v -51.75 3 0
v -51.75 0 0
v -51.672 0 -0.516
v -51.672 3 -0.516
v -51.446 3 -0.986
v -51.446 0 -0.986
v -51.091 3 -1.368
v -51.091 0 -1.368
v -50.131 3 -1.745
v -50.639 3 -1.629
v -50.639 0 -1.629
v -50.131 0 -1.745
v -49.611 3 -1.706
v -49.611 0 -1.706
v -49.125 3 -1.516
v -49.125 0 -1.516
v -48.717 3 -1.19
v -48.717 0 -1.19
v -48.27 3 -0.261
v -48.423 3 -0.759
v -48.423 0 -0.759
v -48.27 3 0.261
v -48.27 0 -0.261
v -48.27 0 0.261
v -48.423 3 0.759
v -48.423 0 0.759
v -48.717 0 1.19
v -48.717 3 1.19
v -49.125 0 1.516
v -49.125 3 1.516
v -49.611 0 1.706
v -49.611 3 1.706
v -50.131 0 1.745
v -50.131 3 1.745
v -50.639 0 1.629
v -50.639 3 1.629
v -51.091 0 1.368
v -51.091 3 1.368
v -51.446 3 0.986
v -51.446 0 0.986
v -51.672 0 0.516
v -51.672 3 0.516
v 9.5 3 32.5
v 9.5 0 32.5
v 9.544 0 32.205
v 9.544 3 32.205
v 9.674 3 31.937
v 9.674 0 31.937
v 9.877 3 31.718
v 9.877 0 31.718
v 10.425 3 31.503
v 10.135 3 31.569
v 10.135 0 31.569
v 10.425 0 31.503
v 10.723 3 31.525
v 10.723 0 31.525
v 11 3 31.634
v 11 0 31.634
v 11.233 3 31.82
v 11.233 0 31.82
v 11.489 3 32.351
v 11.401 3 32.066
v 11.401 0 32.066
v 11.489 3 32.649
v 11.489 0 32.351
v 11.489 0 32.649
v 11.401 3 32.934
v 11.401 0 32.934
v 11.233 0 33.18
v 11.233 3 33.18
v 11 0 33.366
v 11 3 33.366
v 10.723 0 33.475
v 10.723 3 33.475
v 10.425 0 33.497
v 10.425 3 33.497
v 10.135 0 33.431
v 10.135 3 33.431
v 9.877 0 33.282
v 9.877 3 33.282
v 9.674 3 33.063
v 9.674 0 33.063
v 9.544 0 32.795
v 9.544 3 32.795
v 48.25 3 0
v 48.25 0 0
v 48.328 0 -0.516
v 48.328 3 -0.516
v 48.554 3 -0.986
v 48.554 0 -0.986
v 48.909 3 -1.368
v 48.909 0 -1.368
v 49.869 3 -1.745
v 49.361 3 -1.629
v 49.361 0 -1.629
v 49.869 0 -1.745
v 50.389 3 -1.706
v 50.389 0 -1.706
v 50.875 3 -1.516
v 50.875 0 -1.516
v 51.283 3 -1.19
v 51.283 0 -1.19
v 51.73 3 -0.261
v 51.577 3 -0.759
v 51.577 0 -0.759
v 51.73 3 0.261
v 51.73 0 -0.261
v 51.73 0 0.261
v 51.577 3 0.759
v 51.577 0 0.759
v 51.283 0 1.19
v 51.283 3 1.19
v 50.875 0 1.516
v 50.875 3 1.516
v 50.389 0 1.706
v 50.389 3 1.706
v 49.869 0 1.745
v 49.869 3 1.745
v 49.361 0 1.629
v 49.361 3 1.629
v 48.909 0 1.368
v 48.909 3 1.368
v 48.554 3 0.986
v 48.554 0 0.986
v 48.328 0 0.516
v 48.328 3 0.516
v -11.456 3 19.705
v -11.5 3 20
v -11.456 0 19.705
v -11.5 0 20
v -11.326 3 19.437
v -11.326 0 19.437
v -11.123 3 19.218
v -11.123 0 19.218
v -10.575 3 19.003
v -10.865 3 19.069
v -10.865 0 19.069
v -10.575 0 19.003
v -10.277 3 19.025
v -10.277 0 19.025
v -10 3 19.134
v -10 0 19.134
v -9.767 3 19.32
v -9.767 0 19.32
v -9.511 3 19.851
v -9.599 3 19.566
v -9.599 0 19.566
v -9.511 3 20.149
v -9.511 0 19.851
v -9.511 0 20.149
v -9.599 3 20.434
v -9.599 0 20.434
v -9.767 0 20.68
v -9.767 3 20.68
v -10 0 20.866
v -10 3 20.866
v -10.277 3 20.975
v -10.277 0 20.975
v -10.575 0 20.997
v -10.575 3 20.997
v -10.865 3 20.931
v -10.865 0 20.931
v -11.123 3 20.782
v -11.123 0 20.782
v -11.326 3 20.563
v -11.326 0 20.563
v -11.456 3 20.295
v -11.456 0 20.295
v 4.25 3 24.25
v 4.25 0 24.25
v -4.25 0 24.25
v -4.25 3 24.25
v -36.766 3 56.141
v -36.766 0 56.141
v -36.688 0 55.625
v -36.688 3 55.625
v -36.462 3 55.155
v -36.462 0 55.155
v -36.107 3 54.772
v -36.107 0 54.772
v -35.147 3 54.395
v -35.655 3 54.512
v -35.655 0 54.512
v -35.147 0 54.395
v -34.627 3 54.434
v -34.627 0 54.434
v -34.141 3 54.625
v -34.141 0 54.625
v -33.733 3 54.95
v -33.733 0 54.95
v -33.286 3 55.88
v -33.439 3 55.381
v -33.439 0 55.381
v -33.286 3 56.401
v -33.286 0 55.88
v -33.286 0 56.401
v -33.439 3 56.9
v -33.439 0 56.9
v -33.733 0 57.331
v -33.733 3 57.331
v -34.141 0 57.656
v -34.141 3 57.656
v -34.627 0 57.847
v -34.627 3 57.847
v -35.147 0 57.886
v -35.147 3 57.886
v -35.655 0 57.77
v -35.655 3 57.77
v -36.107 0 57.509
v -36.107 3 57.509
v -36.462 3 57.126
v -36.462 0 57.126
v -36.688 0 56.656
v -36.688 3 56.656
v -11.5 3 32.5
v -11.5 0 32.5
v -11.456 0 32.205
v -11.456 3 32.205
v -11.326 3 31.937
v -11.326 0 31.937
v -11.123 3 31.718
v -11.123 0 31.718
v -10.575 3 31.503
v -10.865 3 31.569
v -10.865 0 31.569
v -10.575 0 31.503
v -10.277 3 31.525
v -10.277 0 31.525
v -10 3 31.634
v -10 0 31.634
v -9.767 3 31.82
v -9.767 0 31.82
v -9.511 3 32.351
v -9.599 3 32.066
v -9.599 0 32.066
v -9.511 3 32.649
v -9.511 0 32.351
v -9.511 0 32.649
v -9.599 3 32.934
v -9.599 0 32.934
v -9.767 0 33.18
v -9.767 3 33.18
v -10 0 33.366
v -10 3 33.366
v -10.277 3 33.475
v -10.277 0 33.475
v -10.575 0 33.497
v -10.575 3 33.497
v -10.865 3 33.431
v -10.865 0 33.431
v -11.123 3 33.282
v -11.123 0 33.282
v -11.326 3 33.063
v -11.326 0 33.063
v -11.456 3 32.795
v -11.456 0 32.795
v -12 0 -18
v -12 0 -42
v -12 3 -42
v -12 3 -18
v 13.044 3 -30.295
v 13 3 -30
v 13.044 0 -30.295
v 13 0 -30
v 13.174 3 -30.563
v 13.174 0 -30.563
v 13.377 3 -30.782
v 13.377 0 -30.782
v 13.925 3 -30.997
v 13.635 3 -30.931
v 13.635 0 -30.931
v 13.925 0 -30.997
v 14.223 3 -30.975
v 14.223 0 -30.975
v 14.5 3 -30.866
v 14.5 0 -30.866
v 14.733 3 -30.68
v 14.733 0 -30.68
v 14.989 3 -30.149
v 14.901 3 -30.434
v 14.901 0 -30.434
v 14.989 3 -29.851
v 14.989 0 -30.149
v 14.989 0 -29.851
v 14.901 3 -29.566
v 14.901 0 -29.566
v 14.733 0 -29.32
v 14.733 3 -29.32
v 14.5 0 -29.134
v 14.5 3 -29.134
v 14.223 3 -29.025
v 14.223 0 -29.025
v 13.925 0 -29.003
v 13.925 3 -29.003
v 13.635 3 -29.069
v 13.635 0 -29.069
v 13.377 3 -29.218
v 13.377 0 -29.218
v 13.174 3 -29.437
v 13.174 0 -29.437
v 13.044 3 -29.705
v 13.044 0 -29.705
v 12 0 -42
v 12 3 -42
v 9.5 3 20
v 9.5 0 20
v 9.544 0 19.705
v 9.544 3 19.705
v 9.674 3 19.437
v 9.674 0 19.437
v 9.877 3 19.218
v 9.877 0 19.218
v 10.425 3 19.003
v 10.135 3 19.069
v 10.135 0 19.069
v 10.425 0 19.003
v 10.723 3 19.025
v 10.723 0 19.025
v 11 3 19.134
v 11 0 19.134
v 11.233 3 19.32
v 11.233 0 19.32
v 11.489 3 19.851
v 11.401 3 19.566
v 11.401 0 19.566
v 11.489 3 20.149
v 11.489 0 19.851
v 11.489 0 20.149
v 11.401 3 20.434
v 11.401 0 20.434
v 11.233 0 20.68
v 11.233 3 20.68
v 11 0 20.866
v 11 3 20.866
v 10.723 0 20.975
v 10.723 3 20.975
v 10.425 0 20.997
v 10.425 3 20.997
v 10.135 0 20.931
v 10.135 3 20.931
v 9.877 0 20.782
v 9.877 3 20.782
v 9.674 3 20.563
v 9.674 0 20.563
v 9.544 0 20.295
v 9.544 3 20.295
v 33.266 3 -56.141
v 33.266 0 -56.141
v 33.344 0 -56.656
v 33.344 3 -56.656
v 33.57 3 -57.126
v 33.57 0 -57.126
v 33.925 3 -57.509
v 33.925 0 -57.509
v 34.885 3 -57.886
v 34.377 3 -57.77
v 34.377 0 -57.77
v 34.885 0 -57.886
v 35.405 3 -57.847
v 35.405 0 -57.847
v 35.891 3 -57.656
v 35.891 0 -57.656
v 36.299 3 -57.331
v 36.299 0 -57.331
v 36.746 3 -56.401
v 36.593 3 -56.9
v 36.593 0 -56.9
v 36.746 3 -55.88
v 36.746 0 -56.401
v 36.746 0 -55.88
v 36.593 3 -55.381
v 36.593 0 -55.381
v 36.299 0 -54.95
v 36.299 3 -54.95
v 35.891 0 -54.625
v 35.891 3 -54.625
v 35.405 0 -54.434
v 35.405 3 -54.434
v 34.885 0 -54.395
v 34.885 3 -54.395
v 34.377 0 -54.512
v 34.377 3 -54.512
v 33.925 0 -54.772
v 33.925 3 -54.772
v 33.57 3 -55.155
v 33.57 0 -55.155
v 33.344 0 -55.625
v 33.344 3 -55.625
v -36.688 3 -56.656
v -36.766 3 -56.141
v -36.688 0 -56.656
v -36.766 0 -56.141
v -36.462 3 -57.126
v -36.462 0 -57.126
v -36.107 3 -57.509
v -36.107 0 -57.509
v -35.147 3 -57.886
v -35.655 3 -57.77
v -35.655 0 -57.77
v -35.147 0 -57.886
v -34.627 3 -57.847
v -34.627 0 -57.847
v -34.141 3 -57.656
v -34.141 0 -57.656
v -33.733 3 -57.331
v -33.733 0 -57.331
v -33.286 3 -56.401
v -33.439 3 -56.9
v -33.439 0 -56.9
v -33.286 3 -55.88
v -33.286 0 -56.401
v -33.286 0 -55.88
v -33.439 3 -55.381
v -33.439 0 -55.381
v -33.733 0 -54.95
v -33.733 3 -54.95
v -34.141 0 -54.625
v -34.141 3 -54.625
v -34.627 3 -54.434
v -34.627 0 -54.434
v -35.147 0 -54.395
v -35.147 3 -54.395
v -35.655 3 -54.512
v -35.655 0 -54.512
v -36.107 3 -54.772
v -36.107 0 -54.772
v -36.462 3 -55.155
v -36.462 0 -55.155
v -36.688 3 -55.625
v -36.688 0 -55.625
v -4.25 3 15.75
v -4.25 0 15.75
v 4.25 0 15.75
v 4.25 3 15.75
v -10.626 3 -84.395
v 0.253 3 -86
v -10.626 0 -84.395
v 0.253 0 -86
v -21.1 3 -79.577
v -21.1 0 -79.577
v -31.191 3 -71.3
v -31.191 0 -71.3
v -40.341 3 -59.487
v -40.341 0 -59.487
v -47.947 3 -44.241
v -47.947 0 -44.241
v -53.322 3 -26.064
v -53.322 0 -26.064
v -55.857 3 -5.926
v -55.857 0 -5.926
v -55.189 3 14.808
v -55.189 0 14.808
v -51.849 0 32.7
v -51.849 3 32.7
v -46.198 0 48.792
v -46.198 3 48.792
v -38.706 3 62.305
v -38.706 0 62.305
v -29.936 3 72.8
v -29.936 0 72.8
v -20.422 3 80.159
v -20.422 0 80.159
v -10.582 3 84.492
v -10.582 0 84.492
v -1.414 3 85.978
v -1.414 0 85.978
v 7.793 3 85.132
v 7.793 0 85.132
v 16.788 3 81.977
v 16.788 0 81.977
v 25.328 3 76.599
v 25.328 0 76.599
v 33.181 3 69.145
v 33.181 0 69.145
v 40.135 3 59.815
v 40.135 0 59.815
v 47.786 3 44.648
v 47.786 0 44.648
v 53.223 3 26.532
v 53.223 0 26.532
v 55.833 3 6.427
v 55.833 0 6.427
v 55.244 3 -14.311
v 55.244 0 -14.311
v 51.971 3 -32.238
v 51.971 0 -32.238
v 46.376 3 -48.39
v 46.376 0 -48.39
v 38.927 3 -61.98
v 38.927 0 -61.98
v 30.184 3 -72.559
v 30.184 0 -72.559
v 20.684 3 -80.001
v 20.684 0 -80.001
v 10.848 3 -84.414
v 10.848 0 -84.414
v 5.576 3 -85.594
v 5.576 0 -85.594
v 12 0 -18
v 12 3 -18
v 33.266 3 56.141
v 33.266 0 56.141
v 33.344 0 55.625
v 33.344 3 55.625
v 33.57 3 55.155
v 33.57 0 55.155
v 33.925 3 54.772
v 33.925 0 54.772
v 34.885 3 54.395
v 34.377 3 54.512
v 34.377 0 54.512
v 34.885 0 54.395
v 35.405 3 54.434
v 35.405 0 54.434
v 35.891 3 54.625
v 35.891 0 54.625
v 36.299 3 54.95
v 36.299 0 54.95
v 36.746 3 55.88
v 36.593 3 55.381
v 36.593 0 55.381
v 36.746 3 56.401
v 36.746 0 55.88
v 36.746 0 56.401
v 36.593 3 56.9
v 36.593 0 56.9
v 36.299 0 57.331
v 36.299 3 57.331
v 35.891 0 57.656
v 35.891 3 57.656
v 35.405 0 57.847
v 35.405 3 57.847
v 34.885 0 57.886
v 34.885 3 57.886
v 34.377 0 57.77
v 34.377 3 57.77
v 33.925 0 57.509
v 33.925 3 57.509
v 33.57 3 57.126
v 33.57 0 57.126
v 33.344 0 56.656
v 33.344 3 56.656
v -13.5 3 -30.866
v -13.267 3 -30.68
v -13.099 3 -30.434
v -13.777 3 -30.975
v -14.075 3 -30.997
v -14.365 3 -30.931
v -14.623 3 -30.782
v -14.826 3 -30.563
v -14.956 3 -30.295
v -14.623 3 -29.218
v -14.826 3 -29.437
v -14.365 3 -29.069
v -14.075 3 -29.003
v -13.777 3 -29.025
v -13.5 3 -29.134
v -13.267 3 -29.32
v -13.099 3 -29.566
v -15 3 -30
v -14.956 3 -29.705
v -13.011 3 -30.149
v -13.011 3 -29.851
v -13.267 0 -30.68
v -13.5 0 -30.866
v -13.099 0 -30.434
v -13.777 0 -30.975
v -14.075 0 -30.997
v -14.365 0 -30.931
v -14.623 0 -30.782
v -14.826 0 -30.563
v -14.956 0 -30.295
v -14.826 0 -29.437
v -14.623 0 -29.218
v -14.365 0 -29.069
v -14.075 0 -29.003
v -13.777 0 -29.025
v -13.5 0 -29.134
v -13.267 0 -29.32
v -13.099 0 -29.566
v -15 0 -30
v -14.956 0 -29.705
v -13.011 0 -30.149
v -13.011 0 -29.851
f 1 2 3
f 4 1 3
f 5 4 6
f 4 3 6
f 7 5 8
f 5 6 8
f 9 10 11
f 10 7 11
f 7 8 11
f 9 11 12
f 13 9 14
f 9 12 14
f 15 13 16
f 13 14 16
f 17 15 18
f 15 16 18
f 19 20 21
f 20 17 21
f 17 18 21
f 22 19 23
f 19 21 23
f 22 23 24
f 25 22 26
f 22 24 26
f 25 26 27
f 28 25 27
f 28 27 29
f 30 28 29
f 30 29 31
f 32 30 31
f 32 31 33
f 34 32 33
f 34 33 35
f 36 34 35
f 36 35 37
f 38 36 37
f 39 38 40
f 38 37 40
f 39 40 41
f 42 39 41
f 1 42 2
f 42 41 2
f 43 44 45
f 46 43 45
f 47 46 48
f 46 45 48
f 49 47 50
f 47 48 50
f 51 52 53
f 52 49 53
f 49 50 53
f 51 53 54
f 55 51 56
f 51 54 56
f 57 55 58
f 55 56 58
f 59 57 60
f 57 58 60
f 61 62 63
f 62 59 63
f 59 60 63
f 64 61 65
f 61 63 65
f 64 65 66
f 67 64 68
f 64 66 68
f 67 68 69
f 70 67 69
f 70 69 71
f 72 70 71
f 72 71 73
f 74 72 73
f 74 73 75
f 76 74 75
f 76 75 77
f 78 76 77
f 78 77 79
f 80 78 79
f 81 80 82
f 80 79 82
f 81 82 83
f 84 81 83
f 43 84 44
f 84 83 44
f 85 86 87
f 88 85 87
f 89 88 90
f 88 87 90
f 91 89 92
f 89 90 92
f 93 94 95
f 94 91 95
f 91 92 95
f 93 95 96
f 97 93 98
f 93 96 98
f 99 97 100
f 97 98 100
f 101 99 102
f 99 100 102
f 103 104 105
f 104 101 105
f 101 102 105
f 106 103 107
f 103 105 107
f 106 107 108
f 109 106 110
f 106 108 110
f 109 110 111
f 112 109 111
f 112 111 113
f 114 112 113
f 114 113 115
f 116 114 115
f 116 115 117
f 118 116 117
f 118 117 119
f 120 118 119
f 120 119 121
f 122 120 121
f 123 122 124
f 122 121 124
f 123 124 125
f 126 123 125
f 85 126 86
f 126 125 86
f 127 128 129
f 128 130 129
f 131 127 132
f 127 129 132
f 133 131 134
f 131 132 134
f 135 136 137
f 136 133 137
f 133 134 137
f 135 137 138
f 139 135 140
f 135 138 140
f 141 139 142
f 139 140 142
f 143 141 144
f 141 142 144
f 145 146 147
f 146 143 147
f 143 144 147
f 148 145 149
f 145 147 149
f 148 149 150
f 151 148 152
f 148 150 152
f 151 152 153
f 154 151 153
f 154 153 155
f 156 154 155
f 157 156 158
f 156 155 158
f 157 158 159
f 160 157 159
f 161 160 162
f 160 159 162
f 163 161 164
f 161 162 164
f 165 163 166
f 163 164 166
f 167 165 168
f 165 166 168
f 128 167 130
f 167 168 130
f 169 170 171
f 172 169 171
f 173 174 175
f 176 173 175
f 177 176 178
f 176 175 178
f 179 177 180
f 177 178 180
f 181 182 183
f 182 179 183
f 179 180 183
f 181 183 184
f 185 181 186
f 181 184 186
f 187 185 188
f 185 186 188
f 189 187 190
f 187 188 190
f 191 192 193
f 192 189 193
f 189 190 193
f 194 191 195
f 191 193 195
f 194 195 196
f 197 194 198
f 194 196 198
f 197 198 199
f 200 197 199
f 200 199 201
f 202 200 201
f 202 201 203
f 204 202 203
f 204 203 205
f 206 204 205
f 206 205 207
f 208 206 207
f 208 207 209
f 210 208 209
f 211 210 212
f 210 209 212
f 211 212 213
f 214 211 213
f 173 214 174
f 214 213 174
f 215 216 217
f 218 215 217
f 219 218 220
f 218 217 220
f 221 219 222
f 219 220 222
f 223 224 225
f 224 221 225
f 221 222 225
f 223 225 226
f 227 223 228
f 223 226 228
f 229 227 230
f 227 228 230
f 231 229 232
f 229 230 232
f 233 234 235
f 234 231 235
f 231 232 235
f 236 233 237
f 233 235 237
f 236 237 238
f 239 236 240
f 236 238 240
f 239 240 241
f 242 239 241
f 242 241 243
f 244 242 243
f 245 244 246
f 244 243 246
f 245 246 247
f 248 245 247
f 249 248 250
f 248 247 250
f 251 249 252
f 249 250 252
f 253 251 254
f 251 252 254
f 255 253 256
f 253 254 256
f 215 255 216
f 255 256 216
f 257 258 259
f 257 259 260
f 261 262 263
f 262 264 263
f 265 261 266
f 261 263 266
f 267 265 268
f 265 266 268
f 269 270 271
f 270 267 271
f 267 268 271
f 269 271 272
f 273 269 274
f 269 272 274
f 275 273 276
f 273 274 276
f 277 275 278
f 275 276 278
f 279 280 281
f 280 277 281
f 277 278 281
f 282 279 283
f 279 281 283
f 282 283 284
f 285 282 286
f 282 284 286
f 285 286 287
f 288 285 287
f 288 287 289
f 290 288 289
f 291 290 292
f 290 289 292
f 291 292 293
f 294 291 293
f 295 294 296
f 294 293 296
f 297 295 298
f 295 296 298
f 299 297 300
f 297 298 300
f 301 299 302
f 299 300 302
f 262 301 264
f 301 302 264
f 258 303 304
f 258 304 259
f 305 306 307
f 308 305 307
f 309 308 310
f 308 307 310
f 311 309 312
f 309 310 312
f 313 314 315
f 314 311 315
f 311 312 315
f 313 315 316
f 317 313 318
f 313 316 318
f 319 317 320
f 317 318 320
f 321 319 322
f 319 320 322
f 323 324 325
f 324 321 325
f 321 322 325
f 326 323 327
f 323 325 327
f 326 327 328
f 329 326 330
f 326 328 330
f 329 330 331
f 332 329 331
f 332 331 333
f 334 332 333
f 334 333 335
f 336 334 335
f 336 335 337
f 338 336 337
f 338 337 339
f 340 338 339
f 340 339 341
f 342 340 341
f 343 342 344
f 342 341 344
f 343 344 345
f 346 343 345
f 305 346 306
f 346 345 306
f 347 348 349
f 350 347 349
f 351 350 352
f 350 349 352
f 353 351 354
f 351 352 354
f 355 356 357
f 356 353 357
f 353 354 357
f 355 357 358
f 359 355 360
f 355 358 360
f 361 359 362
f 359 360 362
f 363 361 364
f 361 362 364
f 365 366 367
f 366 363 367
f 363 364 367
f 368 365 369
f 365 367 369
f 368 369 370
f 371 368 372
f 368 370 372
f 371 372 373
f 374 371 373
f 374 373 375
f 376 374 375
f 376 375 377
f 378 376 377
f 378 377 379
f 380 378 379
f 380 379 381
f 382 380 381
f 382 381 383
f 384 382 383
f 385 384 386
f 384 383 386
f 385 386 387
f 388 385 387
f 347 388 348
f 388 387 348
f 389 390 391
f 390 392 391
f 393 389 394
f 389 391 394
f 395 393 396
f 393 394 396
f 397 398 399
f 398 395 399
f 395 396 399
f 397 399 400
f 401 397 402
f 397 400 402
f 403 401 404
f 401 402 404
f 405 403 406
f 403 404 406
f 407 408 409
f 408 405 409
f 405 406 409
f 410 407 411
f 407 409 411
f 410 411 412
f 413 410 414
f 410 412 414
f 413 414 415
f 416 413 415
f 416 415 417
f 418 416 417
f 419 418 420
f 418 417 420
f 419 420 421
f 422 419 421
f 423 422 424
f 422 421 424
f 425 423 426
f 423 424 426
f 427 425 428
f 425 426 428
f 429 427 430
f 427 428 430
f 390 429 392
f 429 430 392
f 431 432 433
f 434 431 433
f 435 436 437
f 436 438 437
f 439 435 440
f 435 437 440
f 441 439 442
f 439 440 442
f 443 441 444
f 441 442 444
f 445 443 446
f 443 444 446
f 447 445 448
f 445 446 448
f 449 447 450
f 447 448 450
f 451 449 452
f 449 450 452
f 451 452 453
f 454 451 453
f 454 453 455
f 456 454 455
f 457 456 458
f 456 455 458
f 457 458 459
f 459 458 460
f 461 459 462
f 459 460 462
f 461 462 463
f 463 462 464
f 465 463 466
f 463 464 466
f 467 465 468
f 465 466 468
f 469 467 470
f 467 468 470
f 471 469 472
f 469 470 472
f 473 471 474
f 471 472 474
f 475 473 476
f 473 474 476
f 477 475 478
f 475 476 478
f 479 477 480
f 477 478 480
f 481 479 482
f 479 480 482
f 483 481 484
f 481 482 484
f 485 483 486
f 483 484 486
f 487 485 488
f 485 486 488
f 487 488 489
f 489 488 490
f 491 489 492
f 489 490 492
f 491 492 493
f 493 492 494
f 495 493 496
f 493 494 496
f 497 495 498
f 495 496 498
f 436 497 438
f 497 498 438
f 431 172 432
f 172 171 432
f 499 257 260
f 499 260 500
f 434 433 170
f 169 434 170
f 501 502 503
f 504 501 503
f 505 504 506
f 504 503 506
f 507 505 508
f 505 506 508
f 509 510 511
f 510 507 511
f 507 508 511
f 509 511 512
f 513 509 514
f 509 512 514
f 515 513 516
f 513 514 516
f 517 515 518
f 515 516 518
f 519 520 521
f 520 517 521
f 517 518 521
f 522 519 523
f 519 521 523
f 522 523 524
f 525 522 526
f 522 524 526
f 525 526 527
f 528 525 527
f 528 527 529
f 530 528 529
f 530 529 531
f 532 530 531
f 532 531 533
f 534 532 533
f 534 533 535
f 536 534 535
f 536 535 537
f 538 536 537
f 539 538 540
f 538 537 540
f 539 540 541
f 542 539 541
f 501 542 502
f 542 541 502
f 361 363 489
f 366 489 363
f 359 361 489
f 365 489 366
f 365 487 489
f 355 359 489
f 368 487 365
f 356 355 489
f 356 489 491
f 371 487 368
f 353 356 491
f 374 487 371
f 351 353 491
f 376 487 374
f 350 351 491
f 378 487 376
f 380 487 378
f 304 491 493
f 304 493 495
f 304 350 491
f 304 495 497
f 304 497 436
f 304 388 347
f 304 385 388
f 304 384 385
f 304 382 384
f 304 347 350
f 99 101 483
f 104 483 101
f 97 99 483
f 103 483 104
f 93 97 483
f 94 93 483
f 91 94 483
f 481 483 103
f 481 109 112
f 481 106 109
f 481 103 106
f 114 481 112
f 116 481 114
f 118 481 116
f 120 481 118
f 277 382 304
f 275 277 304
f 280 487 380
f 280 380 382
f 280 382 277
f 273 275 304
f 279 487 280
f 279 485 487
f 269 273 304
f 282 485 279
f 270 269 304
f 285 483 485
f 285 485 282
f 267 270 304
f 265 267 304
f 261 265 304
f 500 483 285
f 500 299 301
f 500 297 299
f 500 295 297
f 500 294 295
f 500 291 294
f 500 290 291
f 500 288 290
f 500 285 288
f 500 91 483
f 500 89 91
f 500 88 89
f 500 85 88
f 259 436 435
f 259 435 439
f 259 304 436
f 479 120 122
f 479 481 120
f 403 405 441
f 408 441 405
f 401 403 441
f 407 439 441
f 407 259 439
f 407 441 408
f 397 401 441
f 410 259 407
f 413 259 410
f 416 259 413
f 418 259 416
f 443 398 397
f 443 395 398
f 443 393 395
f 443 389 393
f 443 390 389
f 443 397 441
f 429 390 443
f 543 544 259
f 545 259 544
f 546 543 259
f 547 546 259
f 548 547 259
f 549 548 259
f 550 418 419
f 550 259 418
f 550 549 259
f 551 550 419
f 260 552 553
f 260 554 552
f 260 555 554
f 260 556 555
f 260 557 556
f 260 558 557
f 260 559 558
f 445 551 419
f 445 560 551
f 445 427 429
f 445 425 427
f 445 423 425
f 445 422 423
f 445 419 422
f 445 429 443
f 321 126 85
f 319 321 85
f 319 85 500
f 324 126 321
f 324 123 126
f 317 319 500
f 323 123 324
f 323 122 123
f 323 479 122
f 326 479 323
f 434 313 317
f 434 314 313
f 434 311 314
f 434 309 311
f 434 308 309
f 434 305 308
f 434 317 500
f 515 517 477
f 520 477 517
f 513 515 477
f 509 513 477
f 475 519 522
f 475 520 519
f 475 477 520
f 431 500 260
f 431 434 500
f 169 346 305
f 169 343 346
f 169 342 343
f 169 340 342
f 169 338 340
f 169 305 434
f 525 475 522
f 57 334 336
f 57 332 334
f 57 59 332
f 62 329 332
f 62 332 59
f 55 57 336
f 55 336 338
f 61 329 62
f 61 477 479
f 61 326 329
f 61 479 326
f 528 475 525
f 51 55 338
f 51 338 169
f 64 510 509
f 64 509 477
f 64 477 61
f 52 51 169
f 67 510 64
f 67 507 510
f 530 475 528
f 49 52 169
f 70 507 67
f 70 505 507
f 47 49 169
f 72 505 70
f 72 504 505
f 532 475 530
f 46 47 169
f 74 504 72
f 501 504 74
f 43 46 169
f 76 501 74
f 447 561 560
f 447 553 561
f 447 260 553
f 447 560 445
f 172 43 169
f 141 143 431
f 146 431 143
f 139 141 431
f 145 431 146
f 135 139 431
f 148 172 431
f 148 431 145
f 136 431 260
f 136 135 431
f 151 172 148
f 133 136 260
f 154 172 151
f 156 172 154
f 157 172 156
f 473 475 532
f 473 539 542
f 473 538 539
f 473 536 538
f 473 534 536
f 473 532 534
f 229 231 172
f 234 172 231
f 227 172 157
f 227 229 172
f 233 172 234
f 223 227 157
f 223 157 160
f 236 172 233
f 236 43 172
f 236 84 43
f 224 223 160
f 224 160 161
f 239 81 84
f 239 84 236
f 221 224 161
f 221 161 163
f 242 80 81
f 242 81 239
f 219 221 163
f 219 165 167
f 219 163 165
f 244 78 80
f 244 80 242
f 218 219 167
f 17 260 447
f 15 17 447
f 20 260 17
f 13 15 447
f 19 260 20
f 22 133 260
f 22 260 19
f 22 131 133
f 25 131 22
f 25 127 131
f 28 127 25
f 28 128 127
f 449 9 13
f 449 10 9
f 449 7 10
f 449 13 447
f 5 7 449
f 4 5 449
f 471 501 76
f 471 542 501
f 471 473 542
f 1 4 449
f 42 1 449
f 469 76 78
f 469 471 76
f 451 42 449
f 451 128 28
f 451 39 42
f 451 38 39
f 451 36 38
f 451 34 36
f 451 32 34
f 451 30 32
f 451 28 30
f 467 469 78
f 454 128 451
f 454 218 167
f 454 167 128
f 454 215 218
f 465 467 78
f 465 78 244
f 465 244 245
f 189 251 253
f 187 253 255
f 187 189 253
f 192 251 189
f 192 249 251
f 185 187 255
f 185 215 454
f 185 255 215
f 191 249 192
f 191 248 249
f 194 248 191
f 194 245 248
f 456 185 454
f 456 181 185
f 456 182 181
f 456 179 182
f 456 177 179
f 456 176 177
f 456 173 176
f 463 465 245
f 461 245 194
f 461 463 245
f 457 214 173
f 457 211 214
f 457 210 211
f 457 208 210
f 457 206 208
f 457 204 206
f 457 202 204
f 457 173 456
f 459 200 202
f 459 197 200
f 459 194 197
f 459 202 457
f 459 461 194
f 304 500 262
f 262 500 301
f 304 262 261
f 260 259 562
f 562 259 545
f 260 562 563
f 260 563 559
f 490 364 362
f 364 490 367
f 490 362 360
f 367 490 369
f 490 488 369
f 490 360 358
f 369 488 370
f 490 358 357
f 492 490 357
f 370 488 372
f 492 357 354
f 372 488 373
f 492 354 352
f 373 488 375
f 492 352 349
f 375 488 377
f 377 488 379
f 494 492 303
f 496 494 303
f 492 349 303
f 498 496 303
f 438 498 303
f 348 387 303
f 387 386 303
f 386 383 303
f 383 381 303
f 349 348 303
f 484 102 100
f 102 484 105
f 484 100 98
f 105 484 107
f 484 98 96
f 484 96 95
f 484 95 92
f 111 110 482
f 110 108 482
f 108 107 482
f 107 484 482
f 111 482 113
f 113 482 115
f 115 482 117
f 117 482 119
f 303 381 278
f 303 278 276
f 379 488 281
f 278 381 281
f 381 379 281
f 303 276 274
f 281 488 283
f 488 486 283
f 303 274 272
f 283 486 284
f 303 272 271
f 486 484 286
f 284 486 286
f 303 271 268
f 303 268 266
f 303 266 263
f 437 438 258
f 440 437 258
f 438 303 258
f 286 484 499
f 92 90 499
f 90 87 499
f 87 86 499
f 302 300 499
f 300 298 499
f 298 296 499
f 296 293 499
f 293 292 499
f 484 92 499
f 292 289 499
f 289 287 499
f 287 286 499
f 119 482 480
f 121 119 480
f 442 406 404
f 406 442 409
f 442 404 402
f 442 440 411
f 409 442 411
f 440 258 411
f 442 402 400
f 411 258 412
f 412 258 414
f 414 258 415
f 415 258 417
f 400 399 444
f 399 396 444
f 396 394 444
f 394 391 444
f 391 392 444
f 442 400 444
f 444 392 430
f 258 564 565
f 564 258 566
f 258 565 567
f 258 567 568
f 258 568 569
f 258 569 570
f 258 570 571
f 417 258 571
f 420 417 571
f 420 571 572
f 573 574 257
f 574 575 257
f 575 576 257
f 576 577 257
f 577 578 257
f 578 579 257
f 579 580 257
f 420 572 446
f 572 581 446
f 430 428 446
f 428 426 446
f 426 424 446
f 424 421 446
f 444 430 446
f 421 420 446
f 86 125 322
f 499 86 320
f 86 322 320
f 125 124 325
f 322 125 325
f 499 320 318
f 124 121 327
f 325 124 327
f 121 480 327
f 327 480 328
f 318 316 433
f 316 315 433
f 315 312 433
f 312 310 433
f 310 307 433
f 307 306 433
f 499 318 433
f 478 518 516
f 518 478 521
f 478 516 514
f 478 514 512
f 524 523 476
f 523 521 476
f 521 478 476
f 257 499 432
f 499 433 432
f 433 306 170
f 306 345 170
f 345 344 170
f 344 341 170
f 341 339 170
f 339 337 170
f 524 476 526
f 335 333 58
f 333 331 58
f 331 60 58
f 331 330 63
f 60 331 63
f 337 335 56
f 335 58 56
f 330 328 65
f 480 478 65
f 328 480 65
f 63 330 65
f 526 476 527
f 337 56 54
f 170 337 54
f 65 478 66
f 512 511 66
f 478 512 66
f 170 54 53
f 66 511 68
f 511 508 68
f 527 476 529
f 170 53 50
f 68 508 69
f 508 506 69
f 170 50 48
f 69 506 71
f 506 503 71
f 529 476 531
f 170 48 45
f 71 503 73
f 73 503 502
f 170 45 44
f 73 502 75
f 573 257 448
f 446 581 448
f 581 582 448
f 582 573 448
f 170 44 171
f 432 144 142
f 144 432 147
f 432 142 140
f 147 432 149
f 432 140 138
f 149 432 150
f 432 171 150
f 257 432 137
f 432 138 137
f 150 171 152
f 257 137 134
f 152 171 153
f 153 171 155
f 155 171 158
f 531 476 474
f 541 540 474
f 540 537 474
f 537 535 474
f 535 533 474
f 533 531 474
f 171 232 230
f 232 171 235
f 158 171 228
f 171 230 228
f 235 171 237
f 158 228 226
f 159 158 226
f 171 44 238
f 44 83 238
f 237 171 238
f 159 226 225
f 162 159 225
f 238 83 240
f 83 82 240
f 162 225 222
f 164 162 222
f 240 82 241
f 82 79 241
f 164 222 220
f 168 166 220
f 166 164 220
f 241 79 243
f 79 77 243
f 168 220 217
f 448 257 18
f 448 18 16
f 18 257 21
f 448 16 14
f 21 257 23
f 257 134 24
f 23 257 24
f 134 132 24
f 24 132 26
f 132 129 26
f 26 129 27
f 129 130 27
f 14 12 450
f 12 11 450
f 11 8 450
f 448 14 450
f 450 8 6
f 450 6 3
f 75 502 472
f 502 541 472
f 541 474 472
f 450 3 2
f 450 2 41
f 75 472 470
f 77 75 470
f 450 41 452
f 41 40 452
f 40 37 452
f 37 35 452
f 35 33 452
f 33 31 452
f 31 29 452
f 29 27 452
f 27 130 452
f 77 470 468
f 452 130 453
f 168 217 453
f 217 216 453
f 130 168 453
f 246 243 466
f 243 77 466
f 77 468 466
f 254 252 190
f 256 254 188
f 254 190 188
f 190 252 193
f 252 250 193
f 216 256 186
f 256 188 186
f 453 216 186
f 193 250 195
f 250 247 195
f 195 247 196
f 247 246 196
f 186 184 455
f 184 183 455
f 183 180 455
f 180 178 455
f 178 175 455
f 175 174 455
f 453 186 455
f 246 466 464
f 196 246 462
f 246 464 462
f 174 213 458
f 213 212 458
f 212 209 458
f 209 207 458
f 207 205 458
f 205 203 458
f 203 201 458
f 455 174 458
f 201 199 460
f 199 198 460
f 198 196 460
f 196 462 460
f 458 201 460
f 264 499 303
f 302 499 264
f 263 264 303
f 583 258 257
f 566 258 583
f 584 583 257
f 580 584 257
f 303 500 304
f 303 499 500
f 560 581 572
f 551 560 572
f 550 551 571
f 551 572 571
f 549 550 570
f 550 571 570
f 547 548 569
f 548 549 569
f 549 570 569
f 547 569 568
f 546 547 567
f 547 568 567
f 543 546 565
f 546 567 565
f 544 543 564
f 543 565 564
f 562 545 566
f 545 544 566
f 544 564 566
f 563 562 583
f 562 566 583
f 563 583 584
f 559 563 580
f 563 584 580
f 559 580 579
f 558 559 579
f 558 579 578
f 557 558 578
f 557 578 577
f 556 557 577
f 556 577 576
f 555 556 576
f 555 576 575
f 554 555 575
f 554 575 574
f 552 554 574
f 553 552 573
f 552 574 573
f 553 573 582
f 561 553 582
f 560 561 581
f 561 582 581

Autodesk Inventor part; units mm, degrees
ref_plane "YZ Plane" through (0, 0, 0) normal (1, 0, 0) x (0, 1, 0)
ref_plane "XZ Plane" through (0, 0, 0) normal (0, 1, 0) x (-1, 0, 0)
ref_plane "XY Plane" through (0, 0, 0) normal (0, 0, 1) x (1, 0, 0)
sketch "Sketch1" plane through (0, 0, 0) normal (0, 1, 0) x (-1, 0, 0)
  circle A0 centre (50, 0) radius 1.75
  circle A1 centre (35.016, -56.1406) radius 1.75
  line L0 (0, 113.2764) -> (0, -120.1992) construction
  line L1 (64.7812, 0) -> (-65.3256, 0) construction
  ellipse E0 centre (0, 0) end of major axis (-50, 0) minor radius 78.647 construction
  circle A2 centre (-50, 0) radius 1.75
  circle A3 centre (-35.016, -56.1406) radius 1.75
  circle A4 centre (35.016, 56.1406) radius 1.75
  circle A5 centre (-35.016, 56.1406) radius 1.75
  ellipse E1 centre (0, 0) end of major axis (-0.2534, -85.9996) minor radius 56
  circle A6 centre (10.5, 32.5) radius 1
  circle A7 centre (10.5, 20) radius 1
  circle A8 centre (-10.5, 32.5) radius 1
  circle A9 centre (-10.5, 20) radius 1
  circle A10 centre (14, -30) radius 1
  circle A11 centre (-14, -30) radius 1
  line L2 (12, -18) -> (-12, -18)
  line L3 (-12, -18) -> (-12, -42)
  line L4 (-12, -42) -> (12, -42)
  line L5 (12, -42) -> (12, -18)
  line L6 (-4.25, 24.25) -> (4.25, 24.25)
  line L7 (4.25, 24.25) -> (4.25, 15.75)
  line L8 (4.25, 15.75) -> (-4.25, 15.75)
  line L9 (-4.25, 15.75) -> (-4.25, 24.25)
  dimension "d55" = 78.647
  dimension "d56" = 50
  dimension "d60" = 86
  dimension "d61" = 56
  dimension "d49" = 3.5
  dimension "d58" = 3.5
  dimension "d59" = 35.016
  dimension "d66" = 2
  dimension "d69" = 12.5
  dimension "d72" = 21
  dimension "d75" = 10.5
  dimension "d76" = 20
  dimension "d77" = 2
  dimension "d78" = 28
  dimension "d79" = 30
  dimension "d80" = 24
  dimension "d81" = 24
  dimension "d82" = 12
  dimension "d83" = 12
  dimension "d84" = 8.5
  dimension "d85" = 8.5
  dimension "d86" = 4.25
  dimension "d87" = 4.25
extrude "Extrusion7" add sketch "Sketch1" along normal blind 3
properties part number "TopCover"
